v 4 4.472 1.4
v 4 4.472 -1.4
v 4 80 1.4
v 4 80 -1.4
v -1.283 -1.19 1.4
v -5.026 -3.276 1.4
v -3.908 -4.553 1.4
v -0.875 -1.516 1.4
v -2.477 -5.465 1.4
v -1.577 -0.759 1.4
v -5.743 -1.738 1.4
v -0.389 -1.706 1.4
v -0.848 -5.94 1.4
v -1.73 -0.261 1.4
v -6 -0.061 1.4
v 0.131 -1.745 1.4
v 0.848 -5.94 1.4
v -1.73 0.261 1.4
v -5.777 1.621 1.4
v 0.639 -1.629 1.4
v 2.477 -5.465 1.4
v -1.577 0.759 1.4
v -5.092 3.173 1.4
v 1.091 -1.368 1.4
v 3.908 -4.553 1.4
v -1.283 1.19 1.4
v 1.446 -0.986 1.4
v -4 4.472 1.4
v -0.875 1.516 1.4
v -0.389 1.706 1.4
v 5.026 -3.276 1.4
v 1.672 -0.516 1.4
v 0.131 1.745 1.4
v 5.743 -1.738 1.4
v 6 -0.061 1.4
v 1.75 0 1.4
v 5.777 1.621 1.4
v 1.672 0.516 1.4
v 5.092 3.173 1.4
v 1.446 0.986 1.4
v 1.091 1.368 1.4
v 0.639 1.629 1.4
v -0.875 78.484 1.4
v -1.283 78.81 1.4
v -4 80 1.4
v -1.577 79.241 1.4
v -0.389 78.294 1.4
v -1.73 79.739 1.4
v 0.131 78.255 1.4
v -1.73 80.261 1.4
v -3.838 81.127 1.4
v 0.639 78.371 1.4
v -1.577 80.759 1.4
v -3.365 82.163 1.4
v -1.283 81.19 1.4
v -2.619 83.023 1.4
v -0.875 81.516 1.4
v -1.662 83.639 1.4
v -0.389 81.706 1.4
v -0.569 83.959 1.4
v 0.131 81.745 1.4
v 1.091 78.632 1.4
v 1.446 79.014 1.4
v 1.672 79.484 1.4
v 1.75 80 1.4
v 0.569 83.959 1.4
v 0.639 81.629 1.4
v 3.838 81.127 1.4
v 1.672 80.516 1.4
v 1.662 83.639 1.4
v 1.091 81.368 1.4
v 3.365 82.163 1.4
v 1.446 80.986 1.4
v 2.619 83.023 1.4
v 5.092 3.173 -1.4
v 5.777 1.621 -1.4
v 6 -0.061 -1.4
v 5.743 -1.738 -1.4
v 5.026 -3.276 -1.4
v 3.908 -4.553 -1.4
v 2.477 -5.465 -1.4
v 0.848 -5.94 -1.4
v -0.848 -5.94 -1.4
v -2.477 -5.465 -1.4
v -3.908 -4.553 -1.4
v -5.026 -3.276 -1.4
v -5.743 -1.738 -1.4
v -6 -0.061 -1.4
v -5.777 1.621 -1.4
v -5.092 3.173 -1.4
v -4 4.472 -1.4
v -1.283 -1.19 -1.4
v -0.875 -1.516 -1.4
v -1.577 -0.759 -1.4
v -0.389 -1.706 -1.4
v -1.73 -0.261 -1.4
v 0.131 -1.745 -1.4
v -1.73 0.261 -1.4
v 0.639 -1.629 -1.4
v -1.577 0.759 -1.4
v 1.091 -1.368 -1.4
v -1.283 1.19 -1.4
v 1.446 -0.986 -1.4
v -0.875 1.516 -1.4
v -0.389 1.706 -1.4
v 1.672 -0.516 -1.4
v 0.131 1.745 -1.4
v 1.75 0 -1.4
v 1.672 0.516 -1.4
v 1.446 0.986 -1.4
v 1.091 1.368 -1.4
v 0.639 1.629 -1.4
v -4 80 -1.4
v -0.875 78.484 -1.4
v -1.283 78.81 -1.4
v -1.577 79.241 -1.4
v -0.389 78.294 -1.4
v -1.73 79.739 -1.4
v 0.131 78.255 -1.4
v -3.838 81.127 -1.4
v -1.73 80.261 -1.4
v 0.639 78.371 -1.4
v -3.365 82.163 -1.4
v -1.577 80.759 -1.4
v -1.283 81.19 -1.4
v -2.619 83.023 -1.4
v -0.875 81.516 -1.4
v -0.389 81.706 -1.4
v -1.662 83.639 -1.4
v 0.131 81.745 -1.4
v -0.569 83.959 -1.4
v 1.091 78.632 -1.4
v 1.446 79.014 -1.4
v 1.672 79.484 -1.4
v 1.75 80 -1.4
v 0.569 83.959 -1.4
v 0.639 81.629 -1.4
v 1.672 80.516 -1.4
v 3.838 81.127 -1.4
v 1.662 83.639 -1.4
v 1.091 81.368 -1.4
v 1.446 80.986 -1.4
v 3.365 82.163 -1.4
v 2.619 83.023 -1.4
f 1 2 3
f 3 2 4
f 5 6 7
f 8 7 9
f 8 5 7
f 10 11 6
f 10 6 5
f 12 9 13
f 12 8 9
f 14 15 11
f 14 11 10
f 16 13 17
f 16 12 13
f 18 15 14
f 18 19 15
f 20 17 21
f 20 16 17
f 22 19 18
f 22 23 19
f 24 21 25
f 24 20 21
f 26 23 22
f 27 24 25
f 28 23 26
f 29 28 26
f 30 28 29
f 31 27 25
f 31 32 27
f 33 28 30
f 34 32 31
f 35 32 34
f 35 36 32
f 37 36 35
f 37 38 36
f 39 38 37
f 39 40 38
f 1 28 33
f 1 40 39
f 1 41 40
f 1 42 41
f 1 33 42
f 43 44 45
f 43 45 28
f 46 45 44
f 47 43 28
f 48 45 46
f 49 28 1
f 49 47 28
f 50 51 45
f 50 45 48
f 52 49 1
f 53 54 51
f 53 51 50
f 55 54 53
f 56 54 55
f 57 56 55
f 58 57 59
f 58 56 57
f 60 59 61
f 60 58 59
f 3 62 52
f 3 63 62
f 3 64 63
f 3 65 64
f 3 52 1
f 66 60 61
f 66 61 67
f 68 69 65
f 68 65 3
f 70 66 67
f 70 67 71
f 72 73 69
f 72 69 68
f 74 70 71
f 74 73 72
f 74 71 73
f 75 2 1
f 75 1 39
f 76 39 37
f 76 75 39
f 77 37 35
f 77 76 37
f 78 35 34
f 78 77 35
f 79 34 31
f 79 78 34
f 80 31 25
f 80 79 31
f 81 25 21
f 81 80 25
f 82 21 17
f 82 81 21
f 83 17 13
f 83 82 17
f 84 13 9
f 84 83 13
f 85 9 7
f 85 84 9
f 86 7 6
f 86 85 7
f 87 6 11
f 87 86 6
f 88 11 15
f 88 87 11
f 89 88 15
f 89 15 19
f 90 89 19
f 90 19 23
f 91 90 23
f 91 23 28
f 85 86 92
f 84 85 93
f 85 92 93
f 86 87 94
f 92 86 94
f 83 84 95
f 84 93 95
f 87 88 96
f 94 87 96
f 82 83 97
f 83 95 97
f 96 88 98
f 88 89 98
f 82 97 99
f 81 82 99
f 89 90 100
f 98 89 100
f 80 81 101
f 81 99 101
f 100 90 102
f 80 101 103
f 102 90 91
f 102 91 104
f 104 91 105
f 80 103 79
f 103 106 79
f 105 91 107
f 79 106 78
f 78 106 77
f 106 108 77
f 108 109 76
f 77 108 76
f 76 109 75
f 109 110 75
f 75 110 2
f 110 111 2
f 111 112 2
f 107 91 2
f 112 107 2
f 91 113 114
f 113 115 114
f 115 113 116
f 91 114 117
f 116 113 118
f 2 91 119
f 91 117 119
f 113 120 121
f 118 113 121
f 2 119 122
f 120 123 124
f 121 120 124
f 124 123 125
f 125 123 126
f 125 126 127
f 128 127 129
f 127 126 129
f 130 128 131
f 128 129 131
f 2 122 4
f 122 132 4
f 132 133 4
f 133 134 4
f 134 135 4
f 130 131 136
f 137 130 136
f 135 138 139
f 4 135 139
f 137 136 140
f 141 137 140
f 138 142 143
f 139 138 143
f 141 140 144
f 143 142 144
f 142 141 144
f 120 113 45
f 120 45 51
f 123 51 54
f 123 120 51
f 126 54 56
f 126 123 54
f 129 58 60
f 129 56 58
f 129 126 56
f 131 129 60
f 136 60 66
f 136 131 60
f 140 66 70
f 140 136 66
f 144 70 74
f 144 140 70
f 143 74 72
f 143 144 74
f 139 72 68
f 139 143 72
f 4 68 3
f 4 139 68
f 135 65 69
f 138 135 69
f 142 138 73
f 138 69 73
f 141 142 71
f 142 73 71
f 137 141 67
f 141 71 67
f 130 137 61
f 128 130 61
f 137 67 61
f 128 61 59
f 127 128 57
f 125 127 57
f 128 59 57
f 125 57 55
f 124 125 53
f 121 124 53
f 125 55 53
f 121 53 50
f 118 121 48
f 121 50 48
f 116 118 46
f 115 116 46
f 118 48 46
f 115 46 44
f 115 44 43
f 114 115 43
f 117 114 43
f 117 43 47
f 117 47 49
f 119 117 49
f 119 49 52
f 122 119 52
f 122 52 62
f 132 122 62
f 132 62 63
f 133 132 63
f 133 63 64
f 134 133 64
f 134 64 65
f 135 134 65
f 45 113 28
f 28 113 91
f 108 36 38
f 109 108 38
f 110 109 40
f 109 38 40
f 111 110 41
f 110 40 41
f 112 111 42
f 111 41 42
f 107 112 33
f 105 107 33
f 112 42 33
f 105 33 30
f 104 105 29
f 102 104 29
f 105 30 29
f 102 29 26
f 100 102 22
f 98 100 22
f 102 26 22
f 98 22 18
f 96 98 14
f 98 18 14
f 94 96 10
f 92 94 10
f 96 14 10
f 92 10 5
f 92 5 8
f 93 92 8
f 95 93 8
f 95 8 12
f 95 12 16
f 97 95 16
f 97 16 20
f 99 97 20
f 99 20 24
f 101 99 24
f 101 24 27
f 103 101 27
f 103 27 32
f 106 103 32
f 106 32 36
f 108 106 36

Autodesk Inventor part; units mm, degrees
ref_plane "YZ Plane" through (0, 0, 0) normal (1, 0, 0) x (0, 1, 0)
ref_plane "XZ Plane" through (0, 0, 0) normal (0, 1, 0) x (-1, 0, 0)
ref_plane "XY Plane" through (0, 0, 0) normal (0, 0, 1) x (1, 0, 0)
sketch "Sketch1" plane through (0, 0, 0) normal (0, 0, 1) x (1, 0, 0)
  circle A0 centre (0, 0) radius 6
  line L0 (0, -2) -> (0, 80) construction
  line L1 (4, -2) -> (4, 80)
  line L2 (-4, 80) -> (-4, -2)
  arc A1 (-4, -2) -> (4, -2) centre (0, -2) ccw
  arc A2 (4, 80) -> (-4, 80) centre (0, 80) ccw
  point P0 (0, 39)
  dimension "d0" = 12
  dimension "d1" = 8
  dimension "d2" = 80
extrude "Extrusion1" add sketch "Sketch1" along normal mid plane 2.8
sketch "Sketch2" plane through (0, 0, 1.4) normal (0, 0, 1) x (1, 0, 0)
  arc A0 (4, 80) -> (-4, 80) centre (0, 80) ccw construction
  arc A1 (-4, 4.4721) -> (4, 4.4721) centre (0, 0) ccw construction
  circle A2 centre (0, 0) radius 1.75
  circle A3 centre (0, 80) radius 1.75
  line L0 (0, 12.7) -> (0, 5.7) construction
  line L1 (-1.3, 11.4) -> (-1.3, 7)
  line L2 (1.3, 7) -> (1.3, 11.4)
  arc A4 (1.3, 11.4) -> (-1.3, 11.4) centre (0, 11.4) ccw
  arc A5 (-1.3, 7) -> (1.3, 7) centre (0, 7) ccw
  point P0 (0, 9.2)
  dimension "d5" = 7
  dimension "d6" = 2.6
  dimension "d7" = 7
  dimension "d8" = 3.5
  dimension "d9" = 3.5
extrude "Extrusion2" cut sketch "Sketch2" against normal through all contours A2 | A3
